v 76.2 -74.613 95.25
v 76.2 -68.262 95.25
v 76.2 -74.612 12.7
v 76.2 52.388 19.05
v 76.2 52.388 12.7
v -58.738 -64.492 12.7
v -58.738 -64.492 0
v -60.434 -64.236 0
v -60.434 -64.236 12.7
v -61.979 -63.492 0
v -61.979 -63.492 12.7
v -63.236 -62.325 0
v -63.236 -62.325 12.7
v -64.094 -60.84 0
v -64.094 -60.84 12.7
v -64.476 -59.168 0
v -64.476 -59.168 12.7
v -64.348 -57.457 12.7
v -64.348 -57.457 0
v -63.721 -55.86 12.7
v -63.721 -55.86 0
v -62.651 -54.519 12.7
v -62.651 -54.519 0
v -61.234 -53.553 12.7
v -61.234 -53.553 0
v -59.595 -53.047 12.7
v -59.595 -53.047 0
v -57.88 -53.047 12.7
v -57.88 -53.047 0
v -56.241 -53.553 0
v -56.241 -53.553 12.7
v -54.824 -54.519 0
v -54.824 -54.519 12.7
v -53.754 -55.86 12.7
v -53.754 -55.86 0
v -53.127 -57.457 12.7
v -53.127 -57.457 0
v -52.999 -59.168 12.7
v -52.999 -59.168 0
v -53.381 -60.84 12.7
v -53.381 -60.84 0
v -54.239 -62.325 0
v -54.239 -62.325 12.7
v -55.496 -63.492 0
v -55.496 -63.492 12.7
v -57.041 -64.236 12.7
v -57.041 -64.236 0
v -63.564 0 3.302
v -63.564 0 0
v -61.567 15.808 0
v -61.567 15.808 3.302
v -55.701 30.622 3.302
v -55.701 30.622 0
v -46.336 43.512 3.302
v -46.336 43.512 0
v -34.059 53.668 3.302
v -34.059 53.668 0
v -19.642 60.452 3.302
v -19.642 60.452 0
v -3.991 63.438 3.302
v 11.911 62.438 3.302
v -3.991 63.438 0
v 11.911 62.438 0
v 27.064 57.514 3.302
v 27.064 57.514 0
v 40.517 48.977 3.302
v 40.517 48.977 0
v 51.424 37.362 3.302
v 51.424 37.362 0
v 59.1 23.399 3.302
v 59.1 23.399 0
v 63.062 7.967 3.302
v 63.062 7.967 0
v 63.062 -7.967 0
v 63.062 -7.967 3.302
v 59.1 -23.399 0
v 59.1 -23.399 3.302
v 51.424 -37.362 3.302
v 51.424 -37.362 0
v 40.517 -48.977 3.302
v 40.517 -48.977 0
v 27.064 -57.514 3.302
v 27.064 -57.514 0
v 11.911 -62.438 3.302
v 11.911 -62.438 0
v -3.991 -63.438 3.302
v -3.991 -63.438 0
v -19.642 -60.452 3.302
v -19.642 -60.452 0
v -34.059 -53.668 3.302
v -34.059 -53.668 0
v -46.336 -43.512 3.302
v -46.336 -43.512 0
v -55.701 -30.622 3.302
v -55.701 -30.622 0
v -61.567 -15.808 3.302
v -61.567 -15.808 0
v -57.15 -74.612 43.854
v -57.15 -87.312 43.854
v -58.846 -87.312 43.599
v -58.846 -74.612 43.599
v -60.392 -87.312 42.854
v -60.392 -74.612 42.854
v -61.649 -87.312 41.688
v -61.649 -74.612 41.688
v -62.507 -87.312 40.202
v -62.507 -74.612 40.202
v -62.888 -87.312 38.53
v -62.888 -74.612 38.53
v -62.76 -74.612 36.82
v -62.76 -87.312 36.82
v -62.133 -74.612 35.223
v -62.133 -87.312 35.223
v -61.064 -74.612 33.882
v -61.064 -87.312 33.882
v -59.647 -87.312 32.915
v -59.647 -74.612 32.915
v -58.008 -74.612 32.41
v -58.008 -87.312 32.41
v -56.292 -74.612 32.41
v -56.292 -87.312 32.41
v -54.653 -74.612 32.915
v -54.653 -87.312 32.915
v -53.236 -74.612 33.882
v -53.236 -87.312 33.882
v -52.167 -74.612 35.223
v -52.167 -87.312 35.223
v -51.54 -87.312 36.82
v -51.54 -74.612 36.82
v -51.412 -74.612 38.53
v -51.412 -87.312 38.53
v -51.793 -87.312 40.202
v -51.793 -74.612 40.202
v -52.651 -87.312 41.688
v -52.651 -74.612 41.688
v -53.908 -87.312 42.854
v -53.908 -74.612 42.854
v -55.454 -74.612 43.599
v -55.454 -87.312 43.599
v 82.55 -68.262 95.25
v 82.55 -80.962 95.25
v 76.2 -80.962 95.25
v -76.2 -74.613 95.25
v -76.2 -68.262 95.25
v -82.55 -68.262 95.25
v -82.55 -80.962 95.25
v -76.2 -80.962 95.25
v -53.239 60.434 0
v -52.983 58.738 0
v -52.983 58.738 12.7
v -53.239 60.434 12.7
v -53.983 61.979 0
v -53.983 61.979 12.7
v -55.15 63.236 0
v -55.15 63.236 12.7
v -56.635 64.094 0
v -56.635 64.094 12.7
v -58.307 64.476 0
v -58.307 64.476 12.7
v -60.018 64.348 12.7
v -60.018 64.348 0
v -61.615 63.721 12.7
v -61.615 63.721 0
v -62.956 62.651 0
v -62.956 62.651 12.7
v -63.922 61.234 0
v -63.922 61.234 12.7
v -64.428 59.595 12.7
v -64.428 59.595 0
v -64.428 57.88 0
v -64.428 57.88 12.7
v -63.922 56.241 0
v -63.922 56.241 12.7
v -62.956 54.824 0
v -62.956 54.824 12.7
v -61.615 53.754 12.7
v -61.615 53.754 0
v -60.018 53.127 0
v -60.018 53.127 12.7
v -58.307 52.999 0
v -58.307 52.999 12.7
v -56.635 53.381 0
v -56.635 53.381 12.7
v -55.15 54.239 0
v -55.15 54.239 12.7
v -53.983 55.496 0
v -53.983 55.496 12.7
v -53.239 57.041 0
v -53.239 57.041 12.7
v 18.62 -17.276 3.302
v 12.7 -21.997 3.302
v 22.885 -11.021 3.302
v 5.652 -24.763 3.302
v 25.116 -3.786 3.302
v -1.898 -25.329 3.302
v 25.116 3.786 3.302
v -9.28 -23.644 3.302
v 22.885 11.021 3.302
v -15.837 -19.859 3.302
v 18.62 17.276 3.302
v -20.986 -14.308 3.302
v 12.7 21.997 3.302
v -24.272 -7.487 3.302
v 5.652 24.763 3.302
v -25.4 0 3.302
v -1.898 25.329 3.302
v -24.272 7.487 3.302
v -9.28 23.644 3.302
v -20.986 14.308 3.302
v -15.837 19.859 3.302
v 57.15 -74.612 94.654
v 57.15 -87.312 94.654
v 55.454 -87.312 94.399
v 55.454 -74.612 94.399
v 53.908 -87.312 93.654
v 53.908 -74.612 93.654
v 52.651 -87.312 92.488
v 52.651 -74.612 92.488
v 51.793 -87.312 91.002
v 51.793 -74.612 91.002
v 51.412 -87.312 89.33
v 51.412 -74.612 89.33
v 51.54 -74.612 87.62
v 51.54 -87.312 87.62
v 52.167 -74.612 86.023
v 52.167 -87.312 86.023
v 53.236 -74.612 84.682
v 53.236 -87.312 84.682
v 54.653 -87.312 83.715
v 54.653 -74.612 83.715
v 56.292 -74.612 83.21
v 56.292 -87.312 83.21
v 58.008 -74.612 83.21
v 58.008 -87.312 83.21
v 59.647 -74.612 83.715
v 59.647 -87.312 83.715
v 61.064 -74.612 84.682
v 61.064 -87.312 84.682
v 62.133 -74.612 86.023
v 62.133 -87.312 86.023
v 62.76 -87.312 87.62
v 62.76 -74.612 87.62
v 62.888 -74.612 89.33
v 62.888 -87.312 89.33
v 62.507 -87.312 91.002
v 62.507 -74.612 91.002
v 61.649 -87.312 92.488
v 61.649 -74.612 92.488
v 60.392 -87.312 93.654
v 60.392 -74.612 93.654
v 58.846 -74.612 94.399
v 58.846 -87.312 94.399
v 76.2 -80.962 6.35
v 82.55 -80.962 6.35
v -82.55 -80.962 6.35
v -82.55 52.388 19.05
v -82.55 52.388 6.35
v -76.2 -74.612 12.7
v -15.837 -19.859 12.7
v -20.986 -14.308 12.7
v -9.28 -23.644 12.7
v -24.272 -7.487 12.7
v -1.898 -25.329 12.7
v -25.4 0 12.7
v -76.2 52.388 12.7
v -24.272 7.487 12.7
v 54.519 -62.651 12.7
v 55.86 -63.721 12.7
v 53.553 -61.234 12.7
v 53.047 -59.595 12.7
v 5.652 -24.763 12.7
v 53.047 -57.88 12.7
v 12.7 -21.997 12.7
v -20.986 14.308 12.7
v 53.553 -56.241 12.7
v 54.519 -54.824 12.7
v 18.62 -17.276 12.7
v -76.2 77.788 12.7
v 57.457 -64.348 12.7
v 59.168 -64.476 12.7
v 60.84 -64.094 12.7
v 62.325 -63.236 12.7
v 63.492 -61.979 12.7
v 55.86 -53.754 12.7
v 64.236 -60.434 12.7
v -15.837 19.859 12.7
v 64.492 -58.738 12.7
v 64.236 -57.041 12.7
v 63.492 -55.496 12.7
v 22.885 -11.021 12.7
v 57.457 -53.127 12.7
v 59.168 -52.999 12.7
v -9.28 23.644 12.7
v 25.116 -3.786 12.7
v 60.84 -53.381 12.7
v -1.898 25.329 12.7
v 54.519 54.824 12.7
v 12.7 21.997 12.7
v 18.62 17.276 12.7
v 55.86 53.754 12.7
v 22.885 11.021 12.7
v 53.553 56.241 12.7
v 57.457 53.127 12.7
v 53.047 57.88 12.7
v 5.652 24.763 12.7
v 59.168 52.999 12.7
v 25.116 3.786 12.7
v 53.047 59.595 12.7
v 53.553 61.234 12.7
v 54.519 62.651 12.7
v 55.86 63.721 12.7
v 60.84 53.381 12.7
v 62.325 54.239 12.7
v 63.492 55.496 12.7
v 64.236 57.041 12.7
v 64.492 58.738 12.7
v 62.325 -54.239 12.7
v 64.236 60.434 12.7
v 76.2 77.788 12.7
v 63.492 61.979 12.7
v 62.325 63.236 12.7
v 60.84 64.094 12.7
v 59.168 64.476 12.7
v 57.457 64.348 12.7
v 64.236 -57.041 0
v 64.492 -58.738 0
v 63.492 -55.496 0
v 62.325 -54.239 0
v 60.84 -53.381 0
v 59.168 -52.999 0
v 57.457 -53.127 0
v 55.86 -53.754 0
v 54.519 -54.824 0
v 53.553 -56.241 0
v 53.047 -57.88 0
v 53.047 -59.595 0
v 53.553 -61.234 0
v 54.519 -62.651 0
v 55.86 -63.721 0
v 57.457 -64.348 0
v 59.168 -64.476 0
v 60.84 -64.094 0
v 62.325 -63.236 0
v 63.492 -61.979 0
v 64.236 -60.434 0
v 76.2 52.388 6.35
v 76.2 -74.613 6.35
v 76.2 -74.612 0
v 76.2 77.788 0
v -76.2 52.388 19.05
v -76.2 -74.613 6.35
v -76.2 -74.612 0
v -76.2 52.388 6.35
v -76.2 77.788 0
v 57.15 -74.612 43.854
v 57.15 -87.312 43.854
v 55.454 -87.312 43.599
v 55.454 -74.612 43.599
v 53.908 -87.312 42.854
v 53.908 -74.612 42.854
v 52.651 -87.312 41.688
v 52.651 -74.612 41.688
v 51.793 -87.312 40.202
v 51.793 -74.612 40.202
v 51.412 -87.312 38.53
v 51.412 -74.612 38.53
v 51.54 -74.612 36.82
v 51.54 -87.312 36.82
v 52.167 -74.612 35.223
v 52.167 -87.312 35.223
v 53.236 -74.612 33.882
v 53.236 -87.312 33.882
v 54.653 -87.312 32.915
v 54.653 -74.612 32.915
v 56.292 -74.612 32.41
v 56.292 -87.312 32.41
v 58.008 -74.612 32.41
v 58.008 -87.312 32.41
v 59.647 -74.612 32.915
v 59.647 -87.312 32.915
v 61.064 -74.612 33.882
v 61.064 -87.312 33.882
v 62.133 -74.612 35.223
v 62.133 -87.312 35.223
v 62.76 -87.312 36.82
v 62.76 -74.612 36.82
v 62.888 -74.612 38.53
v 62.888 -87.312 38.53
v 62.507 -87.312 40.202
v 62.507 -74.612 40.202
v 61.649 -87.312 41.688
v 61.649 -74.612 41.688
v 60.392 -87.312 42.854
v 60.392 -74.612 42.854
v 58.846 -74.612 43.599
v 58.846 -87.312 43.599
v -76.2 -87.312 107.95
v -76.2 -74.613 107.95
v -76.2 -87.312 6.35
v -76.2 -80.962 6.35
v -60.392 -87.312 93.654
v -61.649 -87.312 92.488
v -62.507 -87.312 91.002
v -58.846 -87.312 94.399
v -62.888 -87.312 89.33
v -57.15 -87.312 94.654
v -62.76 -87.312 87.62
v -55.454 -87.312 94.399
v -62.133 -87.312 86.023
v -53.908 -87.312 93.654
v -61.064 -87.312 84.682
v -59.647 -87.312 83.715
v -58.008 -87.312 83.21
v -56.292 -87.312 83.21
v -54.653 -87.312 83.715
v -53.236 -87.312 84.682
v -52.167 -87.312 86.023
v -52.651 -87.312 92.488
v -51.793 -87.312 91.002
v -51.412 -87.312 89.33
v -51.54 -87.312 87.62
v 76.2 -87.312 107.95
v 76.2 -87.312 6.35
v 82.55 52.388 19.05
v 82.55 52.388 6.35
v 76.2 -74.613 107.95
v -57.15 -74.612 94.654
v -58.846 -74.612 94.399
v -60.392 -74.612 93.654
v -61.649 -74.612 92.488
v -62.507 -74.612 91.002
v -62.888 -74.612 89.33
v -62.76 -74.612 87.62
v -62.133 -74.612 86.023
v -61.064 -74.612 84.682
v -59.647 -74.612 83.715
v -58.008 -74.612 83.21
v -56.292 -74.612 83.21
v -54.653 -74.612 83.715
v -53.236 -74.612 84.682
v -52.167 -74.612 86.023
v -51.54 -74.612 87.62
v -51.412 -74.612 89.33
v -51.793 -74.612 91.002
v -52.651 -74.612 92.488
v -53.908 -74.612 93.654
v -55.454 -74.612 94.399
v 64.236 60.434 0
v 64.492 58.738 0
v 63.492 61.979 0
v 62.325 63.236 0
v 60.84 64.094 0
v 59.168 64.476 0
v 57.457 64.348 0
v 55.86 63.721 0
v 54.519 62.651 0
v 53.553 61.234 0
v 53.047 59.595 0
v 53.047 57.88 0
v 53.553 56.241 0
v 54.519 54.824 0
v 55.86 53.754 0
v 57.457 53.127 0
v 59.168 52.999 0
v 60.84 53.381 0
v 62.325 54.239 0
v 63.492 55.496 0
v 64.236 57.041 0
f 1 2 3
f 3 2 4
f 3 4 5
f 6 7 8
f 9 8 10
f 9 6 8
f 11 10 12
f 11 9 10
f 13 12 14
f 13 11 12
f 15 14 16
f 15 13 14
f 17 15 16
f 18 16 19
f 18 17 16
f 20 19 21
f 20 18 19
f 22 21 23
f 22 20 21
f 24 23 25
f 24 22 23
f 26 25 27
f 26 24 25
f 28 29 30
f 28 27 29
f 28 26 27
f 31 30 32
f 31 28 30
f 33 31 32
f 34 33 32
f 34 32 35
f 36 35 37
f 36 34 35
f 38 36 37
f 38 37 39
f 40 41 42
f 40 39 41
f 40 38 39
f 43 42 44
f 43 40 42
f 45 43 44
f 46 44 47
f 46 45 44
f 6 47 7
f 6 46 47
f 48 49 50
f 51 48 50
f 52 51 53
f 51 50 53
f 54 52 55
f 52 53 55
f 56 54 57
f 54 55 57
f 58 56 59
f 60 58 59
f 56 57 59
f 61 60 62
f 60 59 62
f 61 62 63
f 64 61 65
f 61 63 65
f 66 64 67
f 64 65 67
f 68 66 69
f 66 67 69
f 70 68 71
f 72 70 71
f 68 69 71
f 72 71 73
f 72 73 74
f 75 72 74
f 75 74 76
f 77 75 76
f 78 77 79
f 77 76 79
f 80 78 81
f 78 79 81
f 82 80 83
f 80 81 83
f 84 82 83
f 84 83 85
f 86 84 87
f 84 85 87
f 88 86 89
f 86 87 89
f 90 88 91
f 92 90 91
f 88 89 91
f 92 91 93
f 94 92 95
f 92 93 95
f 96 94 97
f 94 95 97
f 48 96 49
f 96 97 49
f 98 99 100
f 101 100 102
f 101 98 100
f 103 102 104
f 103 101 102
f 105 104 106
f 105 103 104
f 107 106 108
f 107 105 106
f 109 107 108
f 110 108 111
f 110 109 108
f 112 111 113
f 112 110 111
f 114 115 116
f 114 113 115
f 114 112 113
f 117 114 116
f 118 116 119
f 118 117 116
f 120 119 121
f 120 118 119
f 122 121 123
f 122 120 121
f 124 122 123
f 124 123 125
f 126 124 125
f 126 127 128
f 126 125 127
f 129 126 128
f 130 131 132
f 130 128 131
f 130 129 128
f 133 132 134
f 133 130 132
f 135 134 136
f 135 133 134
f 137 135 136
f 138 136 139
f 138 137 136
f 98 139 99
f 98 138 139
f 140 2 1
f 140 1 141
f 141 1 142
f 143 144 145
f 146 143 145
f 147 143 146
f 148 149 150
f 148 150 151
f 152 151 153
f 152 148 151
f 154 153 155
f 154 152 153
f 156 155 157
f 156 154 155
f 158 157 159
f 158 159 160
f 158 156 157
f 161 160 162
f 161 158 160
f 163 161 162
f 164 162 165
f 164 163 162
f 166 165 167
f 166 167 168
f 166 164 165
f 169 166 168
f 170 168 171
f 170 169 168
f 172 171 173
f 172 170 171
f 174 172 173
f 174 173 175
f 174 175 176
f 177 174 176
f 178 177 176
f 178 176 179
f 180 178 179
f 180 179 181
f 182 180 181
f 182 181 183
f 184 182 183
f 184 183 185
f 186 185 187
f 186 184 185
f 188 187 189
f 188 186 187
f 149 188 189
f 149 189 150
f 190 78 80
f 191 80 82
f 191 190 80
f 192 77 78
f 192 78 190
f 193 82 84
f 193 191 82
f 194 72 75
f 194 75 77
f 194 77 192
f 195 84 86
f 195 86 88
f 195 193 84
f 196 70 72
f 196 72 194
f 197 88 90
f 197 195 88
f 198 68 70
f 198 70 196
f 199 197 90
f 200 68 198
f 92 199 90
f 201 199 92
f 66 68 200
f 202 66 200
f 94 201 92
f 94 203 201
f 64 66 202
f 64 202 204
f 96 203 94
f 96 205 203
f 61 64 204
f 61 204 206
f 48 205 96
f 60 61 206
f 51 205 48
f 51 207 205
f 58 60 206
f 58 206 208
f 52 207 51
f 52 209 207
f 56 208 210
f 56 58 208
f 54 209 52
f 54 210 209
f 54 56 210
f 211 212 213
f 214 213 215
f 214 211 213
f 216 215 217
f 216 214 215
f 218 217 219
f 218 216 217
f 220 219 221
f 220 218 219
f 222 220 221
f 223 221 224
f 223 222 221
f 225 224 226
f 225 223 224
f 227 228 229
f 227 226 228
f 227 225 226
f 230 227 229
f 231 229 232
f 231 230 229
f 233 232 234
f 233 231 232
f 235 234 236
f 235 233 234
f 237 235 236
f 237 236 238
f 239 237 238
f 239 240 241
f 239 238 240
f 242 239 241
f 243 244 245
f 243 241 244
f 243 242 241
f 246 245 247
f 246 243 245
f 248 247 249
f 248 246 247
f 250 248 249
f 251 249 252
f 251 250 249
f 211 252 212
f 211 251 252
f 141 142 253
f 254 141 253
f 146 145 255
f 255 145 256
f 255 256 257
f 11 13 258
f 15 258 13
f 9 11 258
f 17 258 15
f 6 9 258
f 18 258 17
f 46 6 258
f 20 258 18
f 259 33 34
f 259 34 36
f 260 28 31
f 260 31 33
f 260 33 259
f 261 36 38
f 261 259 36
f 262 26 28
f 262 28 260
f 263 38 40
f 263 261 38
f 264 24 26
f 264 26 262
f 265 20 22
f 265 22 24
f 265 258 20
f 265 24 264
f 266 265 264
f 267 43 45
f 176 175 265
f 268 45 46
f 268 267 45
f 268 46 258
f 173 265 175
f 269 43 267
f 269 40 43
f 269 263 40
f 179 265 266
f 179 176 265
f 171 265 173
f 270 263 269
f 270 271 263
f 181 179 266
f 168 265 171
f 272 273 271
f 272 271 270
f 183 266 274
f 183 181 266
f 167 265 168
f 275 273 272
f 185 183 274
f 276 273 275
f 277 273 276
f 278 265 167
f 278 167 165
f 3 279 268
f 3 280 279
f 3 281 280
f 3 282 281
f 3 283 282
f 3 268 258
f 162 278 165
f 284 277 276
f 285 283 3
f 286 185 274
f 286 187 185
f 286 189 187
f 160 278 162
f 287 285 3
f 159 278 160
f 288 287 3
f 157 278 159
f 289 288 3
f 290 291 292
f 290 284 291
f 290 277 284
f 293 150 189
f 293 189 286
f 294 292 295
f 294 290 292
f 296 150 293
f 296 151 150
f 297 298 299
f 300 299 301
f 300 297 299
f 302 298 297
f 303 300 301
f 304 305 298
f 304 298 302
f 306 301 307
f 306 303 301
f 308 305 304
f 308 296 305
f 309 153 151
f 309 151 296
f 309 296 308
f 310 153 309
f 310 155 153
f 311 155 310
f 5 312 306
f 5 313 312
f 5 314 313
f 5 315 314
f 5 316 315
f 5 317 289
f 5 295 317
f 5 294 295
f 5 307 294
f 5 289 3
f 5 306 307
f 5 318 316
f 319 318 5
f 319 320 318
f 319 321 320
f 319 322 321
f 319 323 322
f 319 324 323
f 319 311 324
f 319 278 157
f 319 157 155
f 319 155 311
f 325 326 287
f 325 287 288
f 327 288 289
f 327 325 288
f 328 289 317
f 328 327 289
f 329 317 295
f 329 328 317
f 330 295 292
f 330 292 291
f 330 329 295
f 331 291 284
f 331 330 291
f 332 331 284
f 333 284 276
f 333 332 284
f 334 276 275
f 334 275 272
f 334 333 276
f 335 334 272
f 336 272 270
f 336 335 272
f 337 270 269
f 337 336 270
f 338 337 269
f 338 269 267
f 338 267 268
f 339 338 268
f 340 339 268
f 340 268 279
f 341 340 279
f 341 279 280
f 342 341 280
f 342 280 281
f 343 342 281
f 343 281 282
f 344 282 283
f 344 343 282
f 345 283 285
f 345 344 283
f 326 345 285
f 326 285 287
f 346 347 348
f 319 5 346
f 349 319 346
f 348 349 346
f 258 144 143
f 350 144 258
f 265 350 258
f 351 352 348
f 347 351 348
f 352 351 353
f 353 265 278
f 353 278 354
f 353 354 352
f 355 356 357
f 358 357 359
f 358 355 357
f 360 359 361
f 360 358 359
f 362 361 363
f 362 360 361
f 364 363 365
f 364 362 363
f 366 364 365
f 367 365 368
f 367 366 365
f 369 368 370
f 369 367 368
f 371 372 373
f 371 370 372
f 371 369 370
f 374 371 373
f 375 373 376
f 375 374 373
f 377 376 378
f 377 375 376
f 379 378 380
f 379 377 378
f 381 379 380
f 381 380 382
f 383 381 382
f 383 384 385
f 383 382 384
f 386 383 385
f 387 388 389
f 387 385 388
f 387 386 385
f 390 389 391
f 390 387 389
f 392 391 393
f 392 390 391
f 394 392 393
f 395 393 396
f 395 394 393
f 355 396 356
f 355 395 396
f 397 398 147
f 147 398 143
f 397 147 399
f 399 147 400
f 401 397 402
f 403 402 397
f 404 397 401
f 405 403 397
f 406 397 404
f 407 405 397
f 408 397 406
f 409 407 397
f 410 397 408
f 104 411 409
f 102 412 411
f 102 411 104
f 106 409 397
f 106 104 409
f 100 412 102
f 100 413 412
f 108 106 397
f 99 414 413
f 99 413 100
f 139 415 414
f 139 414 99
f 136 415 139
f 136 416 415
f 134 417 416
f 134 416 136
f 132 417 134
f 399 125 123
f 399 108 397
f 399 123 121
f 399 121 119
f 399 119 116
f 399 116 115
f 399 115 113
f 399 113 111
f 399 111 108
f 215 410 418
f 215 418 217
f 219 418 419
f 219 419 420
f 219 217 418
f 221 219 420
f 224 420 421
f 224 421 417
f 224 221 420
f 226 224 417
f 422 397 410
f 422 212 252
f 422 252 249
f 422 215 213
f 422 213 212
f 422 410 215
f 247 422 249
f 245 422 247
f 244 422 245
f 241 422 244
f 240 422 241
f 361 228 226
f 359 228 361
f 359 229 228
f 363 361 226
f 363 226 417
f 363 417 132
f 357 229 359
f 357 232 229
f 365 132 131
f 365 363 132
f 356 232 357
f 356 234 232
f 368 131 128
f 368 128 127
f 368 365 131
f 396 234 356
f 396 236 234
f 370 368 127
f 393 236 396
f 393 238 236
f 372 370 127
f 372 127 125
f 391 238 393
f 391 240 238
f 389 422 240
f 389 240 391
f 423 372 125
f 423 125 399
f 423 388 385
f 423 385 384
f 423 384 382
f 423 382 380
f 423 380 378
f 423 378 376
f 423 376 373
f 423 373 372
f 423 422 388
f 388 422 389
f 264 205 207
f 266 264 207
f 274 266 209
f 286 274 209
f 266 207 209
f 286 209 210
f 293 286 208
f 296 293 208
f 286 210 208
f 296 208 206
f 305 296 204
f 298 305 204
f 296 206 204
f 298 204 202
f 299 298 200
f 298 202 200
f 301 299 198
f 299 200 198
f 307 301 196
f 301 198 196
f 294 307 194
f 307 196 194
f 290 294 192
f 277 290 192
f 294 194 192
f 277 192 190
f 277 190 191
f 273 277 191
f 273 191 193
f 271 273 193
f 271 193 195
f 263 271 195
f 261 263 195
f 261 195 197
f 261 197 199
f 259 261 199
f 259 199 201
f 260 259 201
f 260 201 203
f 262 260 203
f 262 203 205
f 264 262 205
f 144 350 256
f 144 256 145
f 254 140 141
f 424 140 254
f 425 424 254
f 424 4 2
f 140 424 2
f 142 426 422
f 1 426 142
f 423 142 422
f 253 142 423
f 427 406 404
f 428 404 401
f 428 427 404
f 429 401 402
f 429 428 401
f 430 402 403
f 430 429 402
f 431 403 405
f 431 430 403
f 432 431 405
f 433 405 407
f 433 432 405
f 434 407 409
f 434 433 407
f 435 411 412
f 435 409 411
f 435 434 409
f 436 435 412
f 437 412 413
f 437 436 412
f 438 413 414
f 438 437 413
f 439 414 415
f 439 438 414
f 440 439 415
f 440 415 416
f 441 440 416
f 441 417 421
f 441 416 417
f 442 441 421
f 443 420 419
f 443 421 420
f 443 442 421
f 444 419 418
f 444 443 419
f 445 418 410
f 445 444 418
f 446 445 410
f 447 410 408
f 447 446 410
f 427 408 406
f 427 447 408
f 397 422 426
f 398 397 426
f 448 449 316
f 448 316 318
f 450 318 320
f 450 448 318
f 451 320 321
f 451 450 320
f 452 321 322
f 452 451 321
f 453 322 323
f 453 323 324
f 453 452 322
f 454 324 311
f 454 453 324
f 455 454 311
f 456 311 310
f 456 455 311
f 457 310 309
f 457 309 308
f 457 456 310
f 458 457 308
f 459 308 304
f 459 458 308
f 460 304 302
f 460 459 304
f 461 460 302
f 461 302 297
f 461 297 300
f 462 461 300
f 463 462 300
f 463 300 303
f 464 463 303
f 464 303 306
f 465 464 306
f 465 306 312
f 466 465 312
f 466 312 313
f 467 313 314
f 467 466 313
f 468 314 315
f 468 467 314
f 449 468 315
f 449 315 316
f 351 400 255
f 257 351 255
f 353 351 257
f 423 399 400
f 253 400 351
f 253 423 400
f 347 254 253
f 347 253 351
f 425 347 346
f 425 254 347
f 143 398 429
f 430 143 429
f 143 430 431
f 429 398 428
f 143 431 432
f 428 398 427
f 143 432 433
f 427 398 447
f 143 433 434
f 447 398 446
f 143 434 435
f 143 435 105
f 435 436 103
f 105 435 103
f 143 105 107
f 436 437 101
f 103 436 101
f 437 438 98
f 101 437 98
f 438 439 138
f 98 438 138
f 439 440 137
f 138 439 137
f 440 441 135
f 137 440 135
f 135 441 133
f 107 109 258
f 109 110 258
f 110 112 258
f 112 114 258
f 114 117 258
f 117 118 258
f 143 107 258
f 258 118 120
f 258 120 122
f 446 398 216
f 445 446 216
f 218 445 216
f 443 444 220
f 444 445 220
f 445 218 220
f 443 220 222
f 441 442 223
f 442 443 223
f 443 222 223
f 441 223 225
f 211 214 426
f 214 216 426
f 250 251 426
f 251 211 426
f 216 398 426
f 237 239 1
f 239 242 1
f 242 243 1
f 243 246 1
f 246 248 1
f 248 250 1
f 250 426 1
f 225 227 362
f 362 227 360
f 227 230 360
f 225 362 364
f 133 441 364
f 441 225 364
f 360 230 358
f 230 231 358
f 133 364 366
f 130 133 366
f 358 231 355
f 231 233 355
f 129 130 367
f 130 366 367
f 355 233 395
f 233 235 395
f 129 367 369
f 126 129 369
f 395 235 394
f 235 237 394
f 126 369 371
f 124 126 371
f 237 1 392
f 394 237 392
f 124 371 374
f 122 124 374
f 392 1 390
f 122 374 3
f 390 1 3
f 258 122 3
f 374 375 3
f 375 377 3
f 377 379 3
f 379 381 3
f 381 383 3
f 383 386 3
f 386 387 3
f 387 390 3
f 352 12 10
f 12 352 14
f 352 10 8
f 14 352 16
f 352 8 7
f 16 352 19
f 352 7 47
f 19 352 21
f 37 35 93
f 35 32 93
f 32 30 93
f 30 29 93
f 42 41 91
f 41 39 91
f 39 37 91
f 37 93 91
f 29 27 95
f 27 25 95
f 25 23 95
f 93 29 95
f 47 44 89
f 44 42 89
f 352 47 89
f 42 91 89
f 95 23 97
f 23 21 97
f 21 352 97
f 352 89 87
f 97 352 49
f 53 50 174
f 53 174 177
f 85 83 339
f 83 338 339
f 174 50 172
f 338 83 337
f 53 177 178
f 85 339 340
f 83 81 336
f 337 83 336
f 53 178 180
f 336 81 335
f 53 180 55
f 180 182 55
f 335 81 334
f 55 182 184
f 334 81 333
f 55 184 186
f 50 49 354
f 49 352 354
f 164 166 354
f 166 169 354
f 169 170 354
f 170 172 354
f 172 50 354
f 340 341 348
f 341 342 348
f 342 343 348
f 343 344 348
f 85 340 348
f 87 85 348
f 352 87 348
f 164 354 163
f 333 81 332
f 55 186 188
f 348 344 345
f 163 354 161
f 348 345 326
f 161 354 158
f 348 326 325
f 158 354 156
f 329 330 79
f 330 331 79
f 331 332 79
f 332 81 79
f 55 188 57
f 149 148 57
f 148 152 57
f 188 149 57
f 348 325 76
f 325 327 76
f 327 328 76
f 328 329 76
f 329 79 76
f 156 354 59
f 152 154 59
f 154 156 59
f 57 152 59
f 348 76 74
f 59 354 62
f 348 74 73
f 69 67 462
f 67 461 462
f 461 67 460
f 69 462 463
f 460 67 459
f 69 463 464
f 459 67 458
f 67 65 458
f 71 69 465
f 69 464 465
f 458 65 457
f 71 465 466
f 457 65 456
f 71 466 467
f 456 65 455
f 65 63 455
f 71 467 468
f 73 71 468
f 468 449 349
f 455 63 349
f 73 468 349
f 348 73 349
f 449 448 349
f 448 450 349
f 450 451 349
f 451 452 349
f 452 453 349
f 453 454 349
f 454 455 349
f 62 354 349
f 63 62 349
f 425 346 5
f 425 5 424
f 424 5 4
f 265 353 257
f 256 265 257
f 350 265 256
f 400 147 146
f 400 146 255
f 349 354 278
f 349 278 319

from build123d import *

# Parameters (mm, degrees)
SKETCH1_W                 = 152.4
SKETCH1_H                 = 152.4
BASE_EXTRUDE_DEPTH        = 12.7
SKETCH2_W                 = 101.6
SKETCH2_H                 = 12.7
BOSS_EXTRUDE1_DEPTH       = 152.4
BOSS_EXTRUDE2_DEPTH       = 6.35
SKETCH5_R                 = 63.5635
PILOT_BORE_DEPTH          = 3.302
SKETCH6_R                 = 25.4
CUT_EXTRUDE3_DEPTH        = 160.339822581
SKETCH_PATTERN1_OUTLINE_R = 5.75437
SKETCH_PATTERN1_DEPTH     = 12.7
LPATTERN1_COUNT           = 2
LPATTERN1_PITCH           = 114.3
LPATTERN1_COUNT_DIR2      = 2
LPATTERN1_PITCH_DIR2      = 50.8


# Read off the part's stored shape, not the designer's step: Sketch-Pattern1
with BuildPart() as part:
    # Sketch1 → Base-Extrude (new body)
    with BuildSketch(Plane.XY):
        with Locations((0, 1.5875)):
            Rectangle(SKETCH1_W, SKETCH1_H)
    extrude(amount=BASE_EXTRUDE_DEPTH)

    # Sketch2 → Boss-Extrude1 (add)
    with BuildSketch(Plane(origin=(76.2, 0, 0), x_dir=(0, 0, -1), z_dir=(1, 0, 0))):
        with Locations((-57.15, -80.9625)):
            Rectangle(SKETCH2_W, SKETCH2_H)
    extrude(amount=-BOSS_EXTRUDE1_DEPTH)

    # Sketch3 → Boss-Extrude2 (add)
    with BuildSketch(Plane(origin=(76.2, 0, 0), x_dir=(0, 0, -1), z_dir=(1, 0, 0))):
        Polygon((-6.35, -80.9625), (-6.35, 52.3875), (-19.05, 52.3875), (-95.25, -68.2625), (-95.25, -80.9625), align=None)
    boss_extrude2 = extrude(amount=BOSS_EXTRUDE2_DEPTH)

    # Mirror1: Boss-Extrude2 across plane
    add(boss_extrude2.mirror(Plane(origin=(0, 0, 0), x_dir=(0, 0, 1), z_dir=(1, 0, 0))))

    # Sketch5 → pilot bore (cut)
    with BuildSketch(Plane(origin=(0, 0, 0), x_dir=(-1, 0, 0), z_dir=(0, 0, -1))):
        Circle(SKETCH5_R)
    extrude(amount=-PILOT_BORE_DEPTH, mode=Mode.SUBTRACT)

    # Sketch6 → Cut-Extrude3 (cut, through all)
    with BuildSketch(Plane(origin=(0, 0, 3.302), x_dir=(-1, 0, 0), z_dir=(0, 0, -1))):
        Circle(SKETCH6_R)
    extrude(amount=-CUT_EXTRUDE3_DEPTH, mode=Mode.SUBTRACT)

    # Sketch7 → 1/2-20 Tapped Hole1 (revolve, cut)
    with BuildSketch(Plane(origin=(-58.7375, -58.7375, 12.7), x_dir=(0, -1, 0), z_dir=(1, 0, 0))):
        Polygon((0, 0), (0, 35.20757432), (5.75437, 31.75), (5.75437, 0), align=None)
    revolve(axis=Axis((-58.7375, -58.7375, 19.05), (0, 0, -1)), mode=Mode.SUBTRACT)

    # Sketch-Pattern1 outline → Sketch-Pattern1 (cut)
    with BuildSketch(Plane.XY):
        with Locations((-58.7375, 58.7375)):
            Circle(SKETCH_PATTERN1_OUTLINE_R)
        with Locations((58.7375, 58.7375)):
            Circle(SKETCH_PATTERN1_OUTLINE_R)
        with Locations((58.7375, -58.7375)):
            Circle(SKETCH_PATTERN1_OUTLINE_R)
    extrude(amount=SKETCH_PATTERN1_DEPTH, mode=Mode.SUBTRACT)

    # Sketch9 → 1/2-20 Tapped Hole2 (revolve, cut)
    with BuildSketch(Plane(origin=(-57.15, -74.6125, 88.9), x_dir=(0, 0, 1), z_dir=(1, 0, 0))):
        Polygon((0, 0), (0, 35.20757432), (5.75437, 31.75), (5.75437, 0), align=None)
    f_1_2_20_tapped_hole2 = revolve(axis=Axis((-57.15, -68.2625, 88.9), (0, -1, 0)), mode=Mode.SUBTRACT)

    # LPattern1: 1_2-20 Tapped Hole2 2 × 2
    with Locations(*[(i * LPATTERN1_PITCH, 0, -j * LPATTERN1_PITCH_DIR2) for i in range(LPATTERN1_COUNT) for j in range(LPATTERN1_COUNT_DIR2) if (i, j) != (0, 0)]):
        add(f_1_2_20_tapped_hole2, mode=Mode.SUBTRACT)


solid = part.part
